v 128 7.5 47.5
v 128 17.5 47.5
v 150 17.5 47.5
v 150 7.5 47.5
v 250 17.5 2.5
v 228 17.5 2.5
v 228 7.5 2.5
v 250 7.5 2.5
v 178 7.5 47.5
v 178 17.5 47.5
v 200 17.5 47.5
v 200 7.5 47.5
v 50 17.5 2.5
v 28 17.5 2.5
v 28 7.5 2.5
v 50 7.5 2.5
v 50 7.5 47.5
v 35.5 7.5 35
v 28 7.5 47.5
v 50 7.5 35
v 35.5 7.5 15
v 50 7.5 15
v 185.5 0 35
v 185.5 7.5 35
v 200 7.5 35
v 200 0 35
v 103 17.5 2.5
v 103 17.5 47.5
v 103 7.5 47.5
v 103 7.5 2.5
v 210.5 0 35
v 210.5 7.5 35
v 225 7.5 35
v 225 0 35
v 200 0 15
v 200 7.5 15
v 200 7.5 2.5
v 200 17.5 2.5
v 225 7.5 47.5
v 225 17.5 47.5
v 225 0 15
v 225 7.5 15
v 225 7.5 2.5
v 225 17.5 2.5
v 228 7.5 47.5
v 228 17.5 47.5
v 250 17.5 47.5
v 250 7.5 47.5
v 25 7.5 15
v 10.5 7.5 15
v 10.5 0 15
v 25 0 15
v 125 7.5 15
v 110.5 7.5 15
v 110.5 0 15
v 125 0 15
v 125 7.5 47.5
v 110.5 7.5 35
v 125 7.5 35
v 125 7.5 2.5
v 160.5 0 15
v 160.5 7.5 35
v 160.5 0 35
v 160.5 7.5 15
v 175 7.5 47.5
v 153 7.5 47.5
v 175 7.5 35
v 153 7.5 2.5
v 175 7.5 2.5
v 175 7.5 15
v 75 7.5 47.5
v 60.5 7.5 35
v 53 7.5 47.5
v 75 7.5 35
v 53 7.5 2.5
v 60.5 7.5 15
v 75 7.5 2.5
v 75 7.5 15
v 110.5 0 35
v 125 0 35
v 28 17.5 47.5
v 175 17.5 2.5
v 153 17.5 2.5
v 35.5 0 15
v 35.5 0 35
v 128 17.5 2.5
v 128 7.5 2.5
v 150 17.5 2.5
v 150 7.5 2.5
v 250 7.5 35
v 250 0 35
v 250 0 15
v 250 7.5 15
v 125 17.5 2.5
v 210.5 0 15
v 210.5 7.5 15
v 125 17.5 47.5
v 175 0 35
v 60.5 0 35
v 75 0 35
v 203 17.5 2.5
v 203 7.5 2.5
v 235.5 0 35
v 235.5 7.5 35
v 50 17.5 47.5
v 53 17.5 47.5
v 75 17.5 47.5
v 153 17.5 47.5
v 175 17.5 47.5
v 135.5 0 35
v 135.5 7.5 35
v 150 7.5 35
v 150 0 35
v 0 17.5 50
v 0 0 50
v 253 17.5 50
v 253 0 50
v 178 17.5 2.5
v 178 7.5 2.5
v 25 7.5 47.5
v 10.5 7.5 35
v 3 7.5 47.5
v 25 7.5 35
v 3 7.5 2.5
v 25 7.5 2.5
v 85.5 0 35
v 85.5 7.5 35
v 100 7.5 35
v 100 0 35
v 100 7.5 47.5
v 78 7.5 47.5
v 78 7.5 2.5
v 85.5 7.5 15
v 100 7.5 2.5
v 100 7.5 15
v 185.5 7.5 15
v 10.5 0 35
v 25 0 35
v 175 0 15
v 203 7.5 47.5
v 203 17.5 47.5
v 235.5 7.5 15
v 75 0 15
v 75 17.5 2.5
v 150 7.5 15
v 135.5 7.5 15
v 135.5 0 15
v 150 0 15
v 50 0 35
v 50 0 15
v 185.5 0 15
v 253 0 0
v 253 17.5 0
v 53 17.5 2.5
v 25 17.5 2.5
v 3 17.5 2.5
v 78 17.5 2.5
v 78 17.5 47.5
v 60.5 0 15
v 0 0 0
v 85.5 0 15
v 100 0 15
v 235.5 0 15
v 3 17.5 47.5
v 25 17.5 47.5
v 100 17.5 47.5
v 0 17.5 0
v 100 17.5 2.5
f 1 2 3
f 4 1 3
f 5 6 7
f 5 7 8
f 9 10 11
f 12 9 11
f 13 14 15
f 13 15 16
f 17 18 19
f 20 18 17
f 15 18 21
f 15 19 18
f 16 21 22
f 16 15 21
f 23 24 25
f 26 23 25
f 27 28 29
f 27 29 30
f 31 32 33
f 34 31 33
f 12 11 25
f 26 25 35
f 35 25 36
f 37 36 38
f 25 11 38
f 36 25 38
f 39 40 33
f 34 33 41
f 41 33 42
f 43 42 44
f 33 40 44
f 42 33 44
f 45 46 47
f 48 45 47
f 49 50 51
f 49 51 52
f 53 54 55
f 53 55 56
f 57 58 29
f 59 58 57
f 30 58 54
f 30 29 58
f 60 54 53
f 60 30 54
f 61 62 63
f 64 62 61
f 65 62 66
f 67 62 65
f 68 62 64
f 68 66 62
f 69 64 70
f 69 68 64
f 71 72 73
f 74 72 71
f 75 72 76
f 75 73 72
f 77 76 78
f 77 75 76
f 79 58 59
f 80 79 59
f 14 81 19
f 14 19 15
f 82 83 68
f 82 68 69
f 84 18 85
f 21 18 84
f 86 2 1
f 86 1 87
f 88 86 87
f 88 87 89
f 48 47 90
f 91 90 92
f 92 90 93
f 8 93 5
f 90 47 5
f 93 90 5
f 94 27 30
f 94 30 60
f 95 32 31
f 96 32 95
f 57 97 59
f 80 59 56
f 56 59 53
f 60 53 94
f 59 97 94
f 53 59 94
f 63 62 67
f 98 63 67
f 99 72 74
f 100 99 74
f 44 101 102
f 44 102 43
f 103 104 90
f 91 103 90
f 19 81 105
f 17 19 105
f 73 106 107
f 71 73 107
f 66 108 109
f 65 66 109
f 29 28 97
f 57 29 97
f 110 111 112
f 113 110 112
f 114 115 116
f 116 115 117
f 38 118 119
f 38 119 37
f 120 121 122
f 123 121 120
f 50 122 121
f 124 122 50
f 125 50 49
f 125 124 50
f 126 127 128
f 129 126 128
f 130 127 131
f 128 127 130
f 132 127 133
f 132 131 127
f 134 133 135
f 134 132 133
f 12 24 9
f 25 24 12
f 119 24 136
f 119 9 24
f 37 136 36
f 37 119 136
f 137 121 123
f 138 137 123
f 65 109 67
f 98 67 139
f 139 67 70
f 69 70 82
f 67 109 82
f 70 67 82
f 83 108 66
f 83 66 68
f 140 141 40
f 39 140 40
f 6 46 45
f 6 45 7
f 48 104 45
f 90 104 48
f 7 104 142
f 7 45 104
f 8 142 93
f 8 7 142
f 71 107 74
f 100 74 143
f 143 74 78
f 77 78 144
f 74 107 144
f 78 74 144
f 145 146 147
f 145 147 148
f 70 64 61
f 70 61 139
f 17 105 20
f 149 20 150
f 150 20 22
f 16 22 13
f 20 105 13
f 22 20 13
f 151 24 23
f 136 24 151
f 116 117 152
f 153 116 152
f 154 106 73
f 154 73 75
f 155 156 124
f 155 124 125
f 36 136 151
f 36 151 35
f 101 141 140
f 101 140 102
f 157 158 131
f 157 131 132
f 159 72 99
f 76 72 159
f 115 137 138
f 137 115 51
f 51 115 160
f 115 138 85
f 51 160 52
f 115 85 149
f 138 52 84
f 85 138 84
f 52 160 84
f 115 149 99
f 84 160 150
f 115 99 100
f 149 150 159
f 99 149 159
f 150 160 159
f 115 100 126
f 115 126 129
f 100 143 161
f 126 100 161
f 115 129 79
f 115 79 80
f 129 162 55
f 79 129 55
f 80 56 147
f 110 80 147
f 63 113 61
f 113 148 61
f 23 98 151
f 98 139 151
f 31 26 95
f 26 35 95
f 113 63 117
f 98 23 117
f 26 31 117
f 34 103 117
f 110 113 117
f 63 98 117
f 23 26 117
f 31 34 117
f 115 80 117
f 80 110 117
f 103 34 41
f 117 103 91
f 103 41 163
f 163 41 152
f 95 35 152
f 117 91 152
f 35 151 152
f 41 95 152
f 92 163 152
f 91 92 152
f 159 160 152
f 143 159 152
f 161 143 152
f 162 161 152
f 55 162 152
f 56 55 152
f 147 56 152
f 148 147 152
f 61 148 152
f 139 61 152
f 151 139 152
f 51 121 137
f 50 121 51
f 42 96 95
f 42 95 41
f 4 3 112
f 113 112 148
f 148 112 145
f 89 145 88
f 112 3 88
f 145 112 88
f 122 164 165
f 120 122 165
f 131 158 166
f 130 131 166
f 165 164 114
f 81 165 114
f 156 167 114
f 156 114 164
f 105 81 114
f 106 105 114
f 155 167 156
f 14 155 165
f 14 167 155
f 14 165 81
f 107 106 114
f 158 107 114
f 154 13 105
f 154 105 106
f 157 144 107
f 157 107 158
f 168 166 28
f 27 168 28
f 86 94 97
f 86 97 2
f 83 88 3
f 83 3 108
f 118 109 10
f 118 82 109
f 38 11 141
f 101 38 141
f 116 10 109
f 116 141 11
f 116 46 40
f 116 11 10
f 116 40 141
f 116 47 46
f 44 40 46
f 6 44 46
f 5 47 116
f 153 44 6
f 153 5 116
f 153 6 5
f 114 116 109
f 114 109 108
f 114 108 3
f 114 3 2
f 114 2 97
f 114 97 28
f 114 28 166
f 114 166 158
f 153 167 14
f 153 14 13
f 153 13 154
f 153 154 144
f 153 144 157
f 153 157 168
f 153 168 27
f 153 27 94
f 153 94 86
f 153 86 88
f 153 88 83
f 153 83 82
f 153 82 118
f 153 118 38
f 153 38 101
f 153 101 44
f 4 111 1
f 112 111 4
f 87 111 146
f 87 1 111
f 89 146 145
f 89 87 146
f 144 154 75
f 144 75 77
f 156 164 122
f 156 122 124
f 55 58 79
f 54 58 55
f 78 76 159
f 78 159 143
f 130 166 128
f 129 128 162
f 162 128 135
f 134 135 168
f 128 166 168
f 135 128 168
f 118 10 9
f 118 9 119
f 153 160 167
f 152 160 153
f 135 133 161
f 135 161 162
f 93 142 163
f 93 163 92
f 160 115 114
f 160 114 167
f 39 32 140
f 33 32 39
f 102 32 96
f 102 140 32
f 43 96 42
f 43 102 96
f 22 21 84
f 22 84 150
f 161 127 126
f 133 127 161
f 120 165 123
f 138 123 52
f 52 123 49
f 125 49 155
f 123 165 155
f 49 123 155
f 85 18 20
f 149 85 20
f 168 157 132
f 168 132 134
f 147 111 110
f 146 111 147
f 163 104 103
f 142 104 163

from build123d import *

# Parameters (mm, degrees)
SKETCH1_W           = 253
SKETCH1_H           = 50
BOSS_EXTRUDE1_DEPTH = 17.5
SKETCH2_W           = 22
SKETCH2_H           = 45
CUT_EXTRUDE1_DEPTH  = 10
SKETCH3_W           = 14.5
SKETCH3_H           = 20
CUT_EXTRUDE2_DEPTH  = 17.5
LPATTERN1_COUNT     = 10
LPATTERN1_PITCH     = 25


with BuildPart() as part:
    # Sketch1 → Boss-Extrude1 (new body)
    with BuildSketch(Plane(origin=(0, 0, 0), x_dir=(1, 0, 0), z_dir=(0, 1, 0))):
        with Locations((126.5, -25)):
            Rectangle(SKETCH1_W, SKETCH1_H)
    extrude(amount=BOSS_EXTRUDE1_DEPTH)

    # Sketch2 → Cut-Extrude1 (cut)
    with BuildSketch(Plane(origin=(0, 17.5, 0), x_dir=(1, 0, 0), z_dir=(0, 1, 0))):
        with Locations((14, -25)):
            Rectangle(SKETCH2_W, SKETCH2_H)
    cut_extrude1 = extrude(amount=-CUT_EXTRUDE1_DEPTH, mode=Mode.SUBTRACT)

    # Sketch3 → Cut-Extrude2 (cut)
    with BuildSketch(Plane(origin=(0, 17.5, 0), x_dir=(1, 0, 0), z_dir=(0, 1, 0))):
        with Locations((17.75, -25)):
            Rectangle(SKETCH3_W, SKETCH3_H)
    cut_extrude2 = extrude(amount=-CUT_EXTRUDE2_DEPTH, mode=Mode.SUBTRACT)

    # LPattern1: Cut-Extrude1, Cut-Extrude2 ×10
    with Locations(*[(i * LPATTERN1_PITCH, 0, 0) for i in range(1, LPATTERN1_COUNT)]):
        add(cut_extrude1, mode=Mode.SUBTRACT)
        add(cut_extrude2, mode=Mode.SUBTRACT)


solid = part.part
